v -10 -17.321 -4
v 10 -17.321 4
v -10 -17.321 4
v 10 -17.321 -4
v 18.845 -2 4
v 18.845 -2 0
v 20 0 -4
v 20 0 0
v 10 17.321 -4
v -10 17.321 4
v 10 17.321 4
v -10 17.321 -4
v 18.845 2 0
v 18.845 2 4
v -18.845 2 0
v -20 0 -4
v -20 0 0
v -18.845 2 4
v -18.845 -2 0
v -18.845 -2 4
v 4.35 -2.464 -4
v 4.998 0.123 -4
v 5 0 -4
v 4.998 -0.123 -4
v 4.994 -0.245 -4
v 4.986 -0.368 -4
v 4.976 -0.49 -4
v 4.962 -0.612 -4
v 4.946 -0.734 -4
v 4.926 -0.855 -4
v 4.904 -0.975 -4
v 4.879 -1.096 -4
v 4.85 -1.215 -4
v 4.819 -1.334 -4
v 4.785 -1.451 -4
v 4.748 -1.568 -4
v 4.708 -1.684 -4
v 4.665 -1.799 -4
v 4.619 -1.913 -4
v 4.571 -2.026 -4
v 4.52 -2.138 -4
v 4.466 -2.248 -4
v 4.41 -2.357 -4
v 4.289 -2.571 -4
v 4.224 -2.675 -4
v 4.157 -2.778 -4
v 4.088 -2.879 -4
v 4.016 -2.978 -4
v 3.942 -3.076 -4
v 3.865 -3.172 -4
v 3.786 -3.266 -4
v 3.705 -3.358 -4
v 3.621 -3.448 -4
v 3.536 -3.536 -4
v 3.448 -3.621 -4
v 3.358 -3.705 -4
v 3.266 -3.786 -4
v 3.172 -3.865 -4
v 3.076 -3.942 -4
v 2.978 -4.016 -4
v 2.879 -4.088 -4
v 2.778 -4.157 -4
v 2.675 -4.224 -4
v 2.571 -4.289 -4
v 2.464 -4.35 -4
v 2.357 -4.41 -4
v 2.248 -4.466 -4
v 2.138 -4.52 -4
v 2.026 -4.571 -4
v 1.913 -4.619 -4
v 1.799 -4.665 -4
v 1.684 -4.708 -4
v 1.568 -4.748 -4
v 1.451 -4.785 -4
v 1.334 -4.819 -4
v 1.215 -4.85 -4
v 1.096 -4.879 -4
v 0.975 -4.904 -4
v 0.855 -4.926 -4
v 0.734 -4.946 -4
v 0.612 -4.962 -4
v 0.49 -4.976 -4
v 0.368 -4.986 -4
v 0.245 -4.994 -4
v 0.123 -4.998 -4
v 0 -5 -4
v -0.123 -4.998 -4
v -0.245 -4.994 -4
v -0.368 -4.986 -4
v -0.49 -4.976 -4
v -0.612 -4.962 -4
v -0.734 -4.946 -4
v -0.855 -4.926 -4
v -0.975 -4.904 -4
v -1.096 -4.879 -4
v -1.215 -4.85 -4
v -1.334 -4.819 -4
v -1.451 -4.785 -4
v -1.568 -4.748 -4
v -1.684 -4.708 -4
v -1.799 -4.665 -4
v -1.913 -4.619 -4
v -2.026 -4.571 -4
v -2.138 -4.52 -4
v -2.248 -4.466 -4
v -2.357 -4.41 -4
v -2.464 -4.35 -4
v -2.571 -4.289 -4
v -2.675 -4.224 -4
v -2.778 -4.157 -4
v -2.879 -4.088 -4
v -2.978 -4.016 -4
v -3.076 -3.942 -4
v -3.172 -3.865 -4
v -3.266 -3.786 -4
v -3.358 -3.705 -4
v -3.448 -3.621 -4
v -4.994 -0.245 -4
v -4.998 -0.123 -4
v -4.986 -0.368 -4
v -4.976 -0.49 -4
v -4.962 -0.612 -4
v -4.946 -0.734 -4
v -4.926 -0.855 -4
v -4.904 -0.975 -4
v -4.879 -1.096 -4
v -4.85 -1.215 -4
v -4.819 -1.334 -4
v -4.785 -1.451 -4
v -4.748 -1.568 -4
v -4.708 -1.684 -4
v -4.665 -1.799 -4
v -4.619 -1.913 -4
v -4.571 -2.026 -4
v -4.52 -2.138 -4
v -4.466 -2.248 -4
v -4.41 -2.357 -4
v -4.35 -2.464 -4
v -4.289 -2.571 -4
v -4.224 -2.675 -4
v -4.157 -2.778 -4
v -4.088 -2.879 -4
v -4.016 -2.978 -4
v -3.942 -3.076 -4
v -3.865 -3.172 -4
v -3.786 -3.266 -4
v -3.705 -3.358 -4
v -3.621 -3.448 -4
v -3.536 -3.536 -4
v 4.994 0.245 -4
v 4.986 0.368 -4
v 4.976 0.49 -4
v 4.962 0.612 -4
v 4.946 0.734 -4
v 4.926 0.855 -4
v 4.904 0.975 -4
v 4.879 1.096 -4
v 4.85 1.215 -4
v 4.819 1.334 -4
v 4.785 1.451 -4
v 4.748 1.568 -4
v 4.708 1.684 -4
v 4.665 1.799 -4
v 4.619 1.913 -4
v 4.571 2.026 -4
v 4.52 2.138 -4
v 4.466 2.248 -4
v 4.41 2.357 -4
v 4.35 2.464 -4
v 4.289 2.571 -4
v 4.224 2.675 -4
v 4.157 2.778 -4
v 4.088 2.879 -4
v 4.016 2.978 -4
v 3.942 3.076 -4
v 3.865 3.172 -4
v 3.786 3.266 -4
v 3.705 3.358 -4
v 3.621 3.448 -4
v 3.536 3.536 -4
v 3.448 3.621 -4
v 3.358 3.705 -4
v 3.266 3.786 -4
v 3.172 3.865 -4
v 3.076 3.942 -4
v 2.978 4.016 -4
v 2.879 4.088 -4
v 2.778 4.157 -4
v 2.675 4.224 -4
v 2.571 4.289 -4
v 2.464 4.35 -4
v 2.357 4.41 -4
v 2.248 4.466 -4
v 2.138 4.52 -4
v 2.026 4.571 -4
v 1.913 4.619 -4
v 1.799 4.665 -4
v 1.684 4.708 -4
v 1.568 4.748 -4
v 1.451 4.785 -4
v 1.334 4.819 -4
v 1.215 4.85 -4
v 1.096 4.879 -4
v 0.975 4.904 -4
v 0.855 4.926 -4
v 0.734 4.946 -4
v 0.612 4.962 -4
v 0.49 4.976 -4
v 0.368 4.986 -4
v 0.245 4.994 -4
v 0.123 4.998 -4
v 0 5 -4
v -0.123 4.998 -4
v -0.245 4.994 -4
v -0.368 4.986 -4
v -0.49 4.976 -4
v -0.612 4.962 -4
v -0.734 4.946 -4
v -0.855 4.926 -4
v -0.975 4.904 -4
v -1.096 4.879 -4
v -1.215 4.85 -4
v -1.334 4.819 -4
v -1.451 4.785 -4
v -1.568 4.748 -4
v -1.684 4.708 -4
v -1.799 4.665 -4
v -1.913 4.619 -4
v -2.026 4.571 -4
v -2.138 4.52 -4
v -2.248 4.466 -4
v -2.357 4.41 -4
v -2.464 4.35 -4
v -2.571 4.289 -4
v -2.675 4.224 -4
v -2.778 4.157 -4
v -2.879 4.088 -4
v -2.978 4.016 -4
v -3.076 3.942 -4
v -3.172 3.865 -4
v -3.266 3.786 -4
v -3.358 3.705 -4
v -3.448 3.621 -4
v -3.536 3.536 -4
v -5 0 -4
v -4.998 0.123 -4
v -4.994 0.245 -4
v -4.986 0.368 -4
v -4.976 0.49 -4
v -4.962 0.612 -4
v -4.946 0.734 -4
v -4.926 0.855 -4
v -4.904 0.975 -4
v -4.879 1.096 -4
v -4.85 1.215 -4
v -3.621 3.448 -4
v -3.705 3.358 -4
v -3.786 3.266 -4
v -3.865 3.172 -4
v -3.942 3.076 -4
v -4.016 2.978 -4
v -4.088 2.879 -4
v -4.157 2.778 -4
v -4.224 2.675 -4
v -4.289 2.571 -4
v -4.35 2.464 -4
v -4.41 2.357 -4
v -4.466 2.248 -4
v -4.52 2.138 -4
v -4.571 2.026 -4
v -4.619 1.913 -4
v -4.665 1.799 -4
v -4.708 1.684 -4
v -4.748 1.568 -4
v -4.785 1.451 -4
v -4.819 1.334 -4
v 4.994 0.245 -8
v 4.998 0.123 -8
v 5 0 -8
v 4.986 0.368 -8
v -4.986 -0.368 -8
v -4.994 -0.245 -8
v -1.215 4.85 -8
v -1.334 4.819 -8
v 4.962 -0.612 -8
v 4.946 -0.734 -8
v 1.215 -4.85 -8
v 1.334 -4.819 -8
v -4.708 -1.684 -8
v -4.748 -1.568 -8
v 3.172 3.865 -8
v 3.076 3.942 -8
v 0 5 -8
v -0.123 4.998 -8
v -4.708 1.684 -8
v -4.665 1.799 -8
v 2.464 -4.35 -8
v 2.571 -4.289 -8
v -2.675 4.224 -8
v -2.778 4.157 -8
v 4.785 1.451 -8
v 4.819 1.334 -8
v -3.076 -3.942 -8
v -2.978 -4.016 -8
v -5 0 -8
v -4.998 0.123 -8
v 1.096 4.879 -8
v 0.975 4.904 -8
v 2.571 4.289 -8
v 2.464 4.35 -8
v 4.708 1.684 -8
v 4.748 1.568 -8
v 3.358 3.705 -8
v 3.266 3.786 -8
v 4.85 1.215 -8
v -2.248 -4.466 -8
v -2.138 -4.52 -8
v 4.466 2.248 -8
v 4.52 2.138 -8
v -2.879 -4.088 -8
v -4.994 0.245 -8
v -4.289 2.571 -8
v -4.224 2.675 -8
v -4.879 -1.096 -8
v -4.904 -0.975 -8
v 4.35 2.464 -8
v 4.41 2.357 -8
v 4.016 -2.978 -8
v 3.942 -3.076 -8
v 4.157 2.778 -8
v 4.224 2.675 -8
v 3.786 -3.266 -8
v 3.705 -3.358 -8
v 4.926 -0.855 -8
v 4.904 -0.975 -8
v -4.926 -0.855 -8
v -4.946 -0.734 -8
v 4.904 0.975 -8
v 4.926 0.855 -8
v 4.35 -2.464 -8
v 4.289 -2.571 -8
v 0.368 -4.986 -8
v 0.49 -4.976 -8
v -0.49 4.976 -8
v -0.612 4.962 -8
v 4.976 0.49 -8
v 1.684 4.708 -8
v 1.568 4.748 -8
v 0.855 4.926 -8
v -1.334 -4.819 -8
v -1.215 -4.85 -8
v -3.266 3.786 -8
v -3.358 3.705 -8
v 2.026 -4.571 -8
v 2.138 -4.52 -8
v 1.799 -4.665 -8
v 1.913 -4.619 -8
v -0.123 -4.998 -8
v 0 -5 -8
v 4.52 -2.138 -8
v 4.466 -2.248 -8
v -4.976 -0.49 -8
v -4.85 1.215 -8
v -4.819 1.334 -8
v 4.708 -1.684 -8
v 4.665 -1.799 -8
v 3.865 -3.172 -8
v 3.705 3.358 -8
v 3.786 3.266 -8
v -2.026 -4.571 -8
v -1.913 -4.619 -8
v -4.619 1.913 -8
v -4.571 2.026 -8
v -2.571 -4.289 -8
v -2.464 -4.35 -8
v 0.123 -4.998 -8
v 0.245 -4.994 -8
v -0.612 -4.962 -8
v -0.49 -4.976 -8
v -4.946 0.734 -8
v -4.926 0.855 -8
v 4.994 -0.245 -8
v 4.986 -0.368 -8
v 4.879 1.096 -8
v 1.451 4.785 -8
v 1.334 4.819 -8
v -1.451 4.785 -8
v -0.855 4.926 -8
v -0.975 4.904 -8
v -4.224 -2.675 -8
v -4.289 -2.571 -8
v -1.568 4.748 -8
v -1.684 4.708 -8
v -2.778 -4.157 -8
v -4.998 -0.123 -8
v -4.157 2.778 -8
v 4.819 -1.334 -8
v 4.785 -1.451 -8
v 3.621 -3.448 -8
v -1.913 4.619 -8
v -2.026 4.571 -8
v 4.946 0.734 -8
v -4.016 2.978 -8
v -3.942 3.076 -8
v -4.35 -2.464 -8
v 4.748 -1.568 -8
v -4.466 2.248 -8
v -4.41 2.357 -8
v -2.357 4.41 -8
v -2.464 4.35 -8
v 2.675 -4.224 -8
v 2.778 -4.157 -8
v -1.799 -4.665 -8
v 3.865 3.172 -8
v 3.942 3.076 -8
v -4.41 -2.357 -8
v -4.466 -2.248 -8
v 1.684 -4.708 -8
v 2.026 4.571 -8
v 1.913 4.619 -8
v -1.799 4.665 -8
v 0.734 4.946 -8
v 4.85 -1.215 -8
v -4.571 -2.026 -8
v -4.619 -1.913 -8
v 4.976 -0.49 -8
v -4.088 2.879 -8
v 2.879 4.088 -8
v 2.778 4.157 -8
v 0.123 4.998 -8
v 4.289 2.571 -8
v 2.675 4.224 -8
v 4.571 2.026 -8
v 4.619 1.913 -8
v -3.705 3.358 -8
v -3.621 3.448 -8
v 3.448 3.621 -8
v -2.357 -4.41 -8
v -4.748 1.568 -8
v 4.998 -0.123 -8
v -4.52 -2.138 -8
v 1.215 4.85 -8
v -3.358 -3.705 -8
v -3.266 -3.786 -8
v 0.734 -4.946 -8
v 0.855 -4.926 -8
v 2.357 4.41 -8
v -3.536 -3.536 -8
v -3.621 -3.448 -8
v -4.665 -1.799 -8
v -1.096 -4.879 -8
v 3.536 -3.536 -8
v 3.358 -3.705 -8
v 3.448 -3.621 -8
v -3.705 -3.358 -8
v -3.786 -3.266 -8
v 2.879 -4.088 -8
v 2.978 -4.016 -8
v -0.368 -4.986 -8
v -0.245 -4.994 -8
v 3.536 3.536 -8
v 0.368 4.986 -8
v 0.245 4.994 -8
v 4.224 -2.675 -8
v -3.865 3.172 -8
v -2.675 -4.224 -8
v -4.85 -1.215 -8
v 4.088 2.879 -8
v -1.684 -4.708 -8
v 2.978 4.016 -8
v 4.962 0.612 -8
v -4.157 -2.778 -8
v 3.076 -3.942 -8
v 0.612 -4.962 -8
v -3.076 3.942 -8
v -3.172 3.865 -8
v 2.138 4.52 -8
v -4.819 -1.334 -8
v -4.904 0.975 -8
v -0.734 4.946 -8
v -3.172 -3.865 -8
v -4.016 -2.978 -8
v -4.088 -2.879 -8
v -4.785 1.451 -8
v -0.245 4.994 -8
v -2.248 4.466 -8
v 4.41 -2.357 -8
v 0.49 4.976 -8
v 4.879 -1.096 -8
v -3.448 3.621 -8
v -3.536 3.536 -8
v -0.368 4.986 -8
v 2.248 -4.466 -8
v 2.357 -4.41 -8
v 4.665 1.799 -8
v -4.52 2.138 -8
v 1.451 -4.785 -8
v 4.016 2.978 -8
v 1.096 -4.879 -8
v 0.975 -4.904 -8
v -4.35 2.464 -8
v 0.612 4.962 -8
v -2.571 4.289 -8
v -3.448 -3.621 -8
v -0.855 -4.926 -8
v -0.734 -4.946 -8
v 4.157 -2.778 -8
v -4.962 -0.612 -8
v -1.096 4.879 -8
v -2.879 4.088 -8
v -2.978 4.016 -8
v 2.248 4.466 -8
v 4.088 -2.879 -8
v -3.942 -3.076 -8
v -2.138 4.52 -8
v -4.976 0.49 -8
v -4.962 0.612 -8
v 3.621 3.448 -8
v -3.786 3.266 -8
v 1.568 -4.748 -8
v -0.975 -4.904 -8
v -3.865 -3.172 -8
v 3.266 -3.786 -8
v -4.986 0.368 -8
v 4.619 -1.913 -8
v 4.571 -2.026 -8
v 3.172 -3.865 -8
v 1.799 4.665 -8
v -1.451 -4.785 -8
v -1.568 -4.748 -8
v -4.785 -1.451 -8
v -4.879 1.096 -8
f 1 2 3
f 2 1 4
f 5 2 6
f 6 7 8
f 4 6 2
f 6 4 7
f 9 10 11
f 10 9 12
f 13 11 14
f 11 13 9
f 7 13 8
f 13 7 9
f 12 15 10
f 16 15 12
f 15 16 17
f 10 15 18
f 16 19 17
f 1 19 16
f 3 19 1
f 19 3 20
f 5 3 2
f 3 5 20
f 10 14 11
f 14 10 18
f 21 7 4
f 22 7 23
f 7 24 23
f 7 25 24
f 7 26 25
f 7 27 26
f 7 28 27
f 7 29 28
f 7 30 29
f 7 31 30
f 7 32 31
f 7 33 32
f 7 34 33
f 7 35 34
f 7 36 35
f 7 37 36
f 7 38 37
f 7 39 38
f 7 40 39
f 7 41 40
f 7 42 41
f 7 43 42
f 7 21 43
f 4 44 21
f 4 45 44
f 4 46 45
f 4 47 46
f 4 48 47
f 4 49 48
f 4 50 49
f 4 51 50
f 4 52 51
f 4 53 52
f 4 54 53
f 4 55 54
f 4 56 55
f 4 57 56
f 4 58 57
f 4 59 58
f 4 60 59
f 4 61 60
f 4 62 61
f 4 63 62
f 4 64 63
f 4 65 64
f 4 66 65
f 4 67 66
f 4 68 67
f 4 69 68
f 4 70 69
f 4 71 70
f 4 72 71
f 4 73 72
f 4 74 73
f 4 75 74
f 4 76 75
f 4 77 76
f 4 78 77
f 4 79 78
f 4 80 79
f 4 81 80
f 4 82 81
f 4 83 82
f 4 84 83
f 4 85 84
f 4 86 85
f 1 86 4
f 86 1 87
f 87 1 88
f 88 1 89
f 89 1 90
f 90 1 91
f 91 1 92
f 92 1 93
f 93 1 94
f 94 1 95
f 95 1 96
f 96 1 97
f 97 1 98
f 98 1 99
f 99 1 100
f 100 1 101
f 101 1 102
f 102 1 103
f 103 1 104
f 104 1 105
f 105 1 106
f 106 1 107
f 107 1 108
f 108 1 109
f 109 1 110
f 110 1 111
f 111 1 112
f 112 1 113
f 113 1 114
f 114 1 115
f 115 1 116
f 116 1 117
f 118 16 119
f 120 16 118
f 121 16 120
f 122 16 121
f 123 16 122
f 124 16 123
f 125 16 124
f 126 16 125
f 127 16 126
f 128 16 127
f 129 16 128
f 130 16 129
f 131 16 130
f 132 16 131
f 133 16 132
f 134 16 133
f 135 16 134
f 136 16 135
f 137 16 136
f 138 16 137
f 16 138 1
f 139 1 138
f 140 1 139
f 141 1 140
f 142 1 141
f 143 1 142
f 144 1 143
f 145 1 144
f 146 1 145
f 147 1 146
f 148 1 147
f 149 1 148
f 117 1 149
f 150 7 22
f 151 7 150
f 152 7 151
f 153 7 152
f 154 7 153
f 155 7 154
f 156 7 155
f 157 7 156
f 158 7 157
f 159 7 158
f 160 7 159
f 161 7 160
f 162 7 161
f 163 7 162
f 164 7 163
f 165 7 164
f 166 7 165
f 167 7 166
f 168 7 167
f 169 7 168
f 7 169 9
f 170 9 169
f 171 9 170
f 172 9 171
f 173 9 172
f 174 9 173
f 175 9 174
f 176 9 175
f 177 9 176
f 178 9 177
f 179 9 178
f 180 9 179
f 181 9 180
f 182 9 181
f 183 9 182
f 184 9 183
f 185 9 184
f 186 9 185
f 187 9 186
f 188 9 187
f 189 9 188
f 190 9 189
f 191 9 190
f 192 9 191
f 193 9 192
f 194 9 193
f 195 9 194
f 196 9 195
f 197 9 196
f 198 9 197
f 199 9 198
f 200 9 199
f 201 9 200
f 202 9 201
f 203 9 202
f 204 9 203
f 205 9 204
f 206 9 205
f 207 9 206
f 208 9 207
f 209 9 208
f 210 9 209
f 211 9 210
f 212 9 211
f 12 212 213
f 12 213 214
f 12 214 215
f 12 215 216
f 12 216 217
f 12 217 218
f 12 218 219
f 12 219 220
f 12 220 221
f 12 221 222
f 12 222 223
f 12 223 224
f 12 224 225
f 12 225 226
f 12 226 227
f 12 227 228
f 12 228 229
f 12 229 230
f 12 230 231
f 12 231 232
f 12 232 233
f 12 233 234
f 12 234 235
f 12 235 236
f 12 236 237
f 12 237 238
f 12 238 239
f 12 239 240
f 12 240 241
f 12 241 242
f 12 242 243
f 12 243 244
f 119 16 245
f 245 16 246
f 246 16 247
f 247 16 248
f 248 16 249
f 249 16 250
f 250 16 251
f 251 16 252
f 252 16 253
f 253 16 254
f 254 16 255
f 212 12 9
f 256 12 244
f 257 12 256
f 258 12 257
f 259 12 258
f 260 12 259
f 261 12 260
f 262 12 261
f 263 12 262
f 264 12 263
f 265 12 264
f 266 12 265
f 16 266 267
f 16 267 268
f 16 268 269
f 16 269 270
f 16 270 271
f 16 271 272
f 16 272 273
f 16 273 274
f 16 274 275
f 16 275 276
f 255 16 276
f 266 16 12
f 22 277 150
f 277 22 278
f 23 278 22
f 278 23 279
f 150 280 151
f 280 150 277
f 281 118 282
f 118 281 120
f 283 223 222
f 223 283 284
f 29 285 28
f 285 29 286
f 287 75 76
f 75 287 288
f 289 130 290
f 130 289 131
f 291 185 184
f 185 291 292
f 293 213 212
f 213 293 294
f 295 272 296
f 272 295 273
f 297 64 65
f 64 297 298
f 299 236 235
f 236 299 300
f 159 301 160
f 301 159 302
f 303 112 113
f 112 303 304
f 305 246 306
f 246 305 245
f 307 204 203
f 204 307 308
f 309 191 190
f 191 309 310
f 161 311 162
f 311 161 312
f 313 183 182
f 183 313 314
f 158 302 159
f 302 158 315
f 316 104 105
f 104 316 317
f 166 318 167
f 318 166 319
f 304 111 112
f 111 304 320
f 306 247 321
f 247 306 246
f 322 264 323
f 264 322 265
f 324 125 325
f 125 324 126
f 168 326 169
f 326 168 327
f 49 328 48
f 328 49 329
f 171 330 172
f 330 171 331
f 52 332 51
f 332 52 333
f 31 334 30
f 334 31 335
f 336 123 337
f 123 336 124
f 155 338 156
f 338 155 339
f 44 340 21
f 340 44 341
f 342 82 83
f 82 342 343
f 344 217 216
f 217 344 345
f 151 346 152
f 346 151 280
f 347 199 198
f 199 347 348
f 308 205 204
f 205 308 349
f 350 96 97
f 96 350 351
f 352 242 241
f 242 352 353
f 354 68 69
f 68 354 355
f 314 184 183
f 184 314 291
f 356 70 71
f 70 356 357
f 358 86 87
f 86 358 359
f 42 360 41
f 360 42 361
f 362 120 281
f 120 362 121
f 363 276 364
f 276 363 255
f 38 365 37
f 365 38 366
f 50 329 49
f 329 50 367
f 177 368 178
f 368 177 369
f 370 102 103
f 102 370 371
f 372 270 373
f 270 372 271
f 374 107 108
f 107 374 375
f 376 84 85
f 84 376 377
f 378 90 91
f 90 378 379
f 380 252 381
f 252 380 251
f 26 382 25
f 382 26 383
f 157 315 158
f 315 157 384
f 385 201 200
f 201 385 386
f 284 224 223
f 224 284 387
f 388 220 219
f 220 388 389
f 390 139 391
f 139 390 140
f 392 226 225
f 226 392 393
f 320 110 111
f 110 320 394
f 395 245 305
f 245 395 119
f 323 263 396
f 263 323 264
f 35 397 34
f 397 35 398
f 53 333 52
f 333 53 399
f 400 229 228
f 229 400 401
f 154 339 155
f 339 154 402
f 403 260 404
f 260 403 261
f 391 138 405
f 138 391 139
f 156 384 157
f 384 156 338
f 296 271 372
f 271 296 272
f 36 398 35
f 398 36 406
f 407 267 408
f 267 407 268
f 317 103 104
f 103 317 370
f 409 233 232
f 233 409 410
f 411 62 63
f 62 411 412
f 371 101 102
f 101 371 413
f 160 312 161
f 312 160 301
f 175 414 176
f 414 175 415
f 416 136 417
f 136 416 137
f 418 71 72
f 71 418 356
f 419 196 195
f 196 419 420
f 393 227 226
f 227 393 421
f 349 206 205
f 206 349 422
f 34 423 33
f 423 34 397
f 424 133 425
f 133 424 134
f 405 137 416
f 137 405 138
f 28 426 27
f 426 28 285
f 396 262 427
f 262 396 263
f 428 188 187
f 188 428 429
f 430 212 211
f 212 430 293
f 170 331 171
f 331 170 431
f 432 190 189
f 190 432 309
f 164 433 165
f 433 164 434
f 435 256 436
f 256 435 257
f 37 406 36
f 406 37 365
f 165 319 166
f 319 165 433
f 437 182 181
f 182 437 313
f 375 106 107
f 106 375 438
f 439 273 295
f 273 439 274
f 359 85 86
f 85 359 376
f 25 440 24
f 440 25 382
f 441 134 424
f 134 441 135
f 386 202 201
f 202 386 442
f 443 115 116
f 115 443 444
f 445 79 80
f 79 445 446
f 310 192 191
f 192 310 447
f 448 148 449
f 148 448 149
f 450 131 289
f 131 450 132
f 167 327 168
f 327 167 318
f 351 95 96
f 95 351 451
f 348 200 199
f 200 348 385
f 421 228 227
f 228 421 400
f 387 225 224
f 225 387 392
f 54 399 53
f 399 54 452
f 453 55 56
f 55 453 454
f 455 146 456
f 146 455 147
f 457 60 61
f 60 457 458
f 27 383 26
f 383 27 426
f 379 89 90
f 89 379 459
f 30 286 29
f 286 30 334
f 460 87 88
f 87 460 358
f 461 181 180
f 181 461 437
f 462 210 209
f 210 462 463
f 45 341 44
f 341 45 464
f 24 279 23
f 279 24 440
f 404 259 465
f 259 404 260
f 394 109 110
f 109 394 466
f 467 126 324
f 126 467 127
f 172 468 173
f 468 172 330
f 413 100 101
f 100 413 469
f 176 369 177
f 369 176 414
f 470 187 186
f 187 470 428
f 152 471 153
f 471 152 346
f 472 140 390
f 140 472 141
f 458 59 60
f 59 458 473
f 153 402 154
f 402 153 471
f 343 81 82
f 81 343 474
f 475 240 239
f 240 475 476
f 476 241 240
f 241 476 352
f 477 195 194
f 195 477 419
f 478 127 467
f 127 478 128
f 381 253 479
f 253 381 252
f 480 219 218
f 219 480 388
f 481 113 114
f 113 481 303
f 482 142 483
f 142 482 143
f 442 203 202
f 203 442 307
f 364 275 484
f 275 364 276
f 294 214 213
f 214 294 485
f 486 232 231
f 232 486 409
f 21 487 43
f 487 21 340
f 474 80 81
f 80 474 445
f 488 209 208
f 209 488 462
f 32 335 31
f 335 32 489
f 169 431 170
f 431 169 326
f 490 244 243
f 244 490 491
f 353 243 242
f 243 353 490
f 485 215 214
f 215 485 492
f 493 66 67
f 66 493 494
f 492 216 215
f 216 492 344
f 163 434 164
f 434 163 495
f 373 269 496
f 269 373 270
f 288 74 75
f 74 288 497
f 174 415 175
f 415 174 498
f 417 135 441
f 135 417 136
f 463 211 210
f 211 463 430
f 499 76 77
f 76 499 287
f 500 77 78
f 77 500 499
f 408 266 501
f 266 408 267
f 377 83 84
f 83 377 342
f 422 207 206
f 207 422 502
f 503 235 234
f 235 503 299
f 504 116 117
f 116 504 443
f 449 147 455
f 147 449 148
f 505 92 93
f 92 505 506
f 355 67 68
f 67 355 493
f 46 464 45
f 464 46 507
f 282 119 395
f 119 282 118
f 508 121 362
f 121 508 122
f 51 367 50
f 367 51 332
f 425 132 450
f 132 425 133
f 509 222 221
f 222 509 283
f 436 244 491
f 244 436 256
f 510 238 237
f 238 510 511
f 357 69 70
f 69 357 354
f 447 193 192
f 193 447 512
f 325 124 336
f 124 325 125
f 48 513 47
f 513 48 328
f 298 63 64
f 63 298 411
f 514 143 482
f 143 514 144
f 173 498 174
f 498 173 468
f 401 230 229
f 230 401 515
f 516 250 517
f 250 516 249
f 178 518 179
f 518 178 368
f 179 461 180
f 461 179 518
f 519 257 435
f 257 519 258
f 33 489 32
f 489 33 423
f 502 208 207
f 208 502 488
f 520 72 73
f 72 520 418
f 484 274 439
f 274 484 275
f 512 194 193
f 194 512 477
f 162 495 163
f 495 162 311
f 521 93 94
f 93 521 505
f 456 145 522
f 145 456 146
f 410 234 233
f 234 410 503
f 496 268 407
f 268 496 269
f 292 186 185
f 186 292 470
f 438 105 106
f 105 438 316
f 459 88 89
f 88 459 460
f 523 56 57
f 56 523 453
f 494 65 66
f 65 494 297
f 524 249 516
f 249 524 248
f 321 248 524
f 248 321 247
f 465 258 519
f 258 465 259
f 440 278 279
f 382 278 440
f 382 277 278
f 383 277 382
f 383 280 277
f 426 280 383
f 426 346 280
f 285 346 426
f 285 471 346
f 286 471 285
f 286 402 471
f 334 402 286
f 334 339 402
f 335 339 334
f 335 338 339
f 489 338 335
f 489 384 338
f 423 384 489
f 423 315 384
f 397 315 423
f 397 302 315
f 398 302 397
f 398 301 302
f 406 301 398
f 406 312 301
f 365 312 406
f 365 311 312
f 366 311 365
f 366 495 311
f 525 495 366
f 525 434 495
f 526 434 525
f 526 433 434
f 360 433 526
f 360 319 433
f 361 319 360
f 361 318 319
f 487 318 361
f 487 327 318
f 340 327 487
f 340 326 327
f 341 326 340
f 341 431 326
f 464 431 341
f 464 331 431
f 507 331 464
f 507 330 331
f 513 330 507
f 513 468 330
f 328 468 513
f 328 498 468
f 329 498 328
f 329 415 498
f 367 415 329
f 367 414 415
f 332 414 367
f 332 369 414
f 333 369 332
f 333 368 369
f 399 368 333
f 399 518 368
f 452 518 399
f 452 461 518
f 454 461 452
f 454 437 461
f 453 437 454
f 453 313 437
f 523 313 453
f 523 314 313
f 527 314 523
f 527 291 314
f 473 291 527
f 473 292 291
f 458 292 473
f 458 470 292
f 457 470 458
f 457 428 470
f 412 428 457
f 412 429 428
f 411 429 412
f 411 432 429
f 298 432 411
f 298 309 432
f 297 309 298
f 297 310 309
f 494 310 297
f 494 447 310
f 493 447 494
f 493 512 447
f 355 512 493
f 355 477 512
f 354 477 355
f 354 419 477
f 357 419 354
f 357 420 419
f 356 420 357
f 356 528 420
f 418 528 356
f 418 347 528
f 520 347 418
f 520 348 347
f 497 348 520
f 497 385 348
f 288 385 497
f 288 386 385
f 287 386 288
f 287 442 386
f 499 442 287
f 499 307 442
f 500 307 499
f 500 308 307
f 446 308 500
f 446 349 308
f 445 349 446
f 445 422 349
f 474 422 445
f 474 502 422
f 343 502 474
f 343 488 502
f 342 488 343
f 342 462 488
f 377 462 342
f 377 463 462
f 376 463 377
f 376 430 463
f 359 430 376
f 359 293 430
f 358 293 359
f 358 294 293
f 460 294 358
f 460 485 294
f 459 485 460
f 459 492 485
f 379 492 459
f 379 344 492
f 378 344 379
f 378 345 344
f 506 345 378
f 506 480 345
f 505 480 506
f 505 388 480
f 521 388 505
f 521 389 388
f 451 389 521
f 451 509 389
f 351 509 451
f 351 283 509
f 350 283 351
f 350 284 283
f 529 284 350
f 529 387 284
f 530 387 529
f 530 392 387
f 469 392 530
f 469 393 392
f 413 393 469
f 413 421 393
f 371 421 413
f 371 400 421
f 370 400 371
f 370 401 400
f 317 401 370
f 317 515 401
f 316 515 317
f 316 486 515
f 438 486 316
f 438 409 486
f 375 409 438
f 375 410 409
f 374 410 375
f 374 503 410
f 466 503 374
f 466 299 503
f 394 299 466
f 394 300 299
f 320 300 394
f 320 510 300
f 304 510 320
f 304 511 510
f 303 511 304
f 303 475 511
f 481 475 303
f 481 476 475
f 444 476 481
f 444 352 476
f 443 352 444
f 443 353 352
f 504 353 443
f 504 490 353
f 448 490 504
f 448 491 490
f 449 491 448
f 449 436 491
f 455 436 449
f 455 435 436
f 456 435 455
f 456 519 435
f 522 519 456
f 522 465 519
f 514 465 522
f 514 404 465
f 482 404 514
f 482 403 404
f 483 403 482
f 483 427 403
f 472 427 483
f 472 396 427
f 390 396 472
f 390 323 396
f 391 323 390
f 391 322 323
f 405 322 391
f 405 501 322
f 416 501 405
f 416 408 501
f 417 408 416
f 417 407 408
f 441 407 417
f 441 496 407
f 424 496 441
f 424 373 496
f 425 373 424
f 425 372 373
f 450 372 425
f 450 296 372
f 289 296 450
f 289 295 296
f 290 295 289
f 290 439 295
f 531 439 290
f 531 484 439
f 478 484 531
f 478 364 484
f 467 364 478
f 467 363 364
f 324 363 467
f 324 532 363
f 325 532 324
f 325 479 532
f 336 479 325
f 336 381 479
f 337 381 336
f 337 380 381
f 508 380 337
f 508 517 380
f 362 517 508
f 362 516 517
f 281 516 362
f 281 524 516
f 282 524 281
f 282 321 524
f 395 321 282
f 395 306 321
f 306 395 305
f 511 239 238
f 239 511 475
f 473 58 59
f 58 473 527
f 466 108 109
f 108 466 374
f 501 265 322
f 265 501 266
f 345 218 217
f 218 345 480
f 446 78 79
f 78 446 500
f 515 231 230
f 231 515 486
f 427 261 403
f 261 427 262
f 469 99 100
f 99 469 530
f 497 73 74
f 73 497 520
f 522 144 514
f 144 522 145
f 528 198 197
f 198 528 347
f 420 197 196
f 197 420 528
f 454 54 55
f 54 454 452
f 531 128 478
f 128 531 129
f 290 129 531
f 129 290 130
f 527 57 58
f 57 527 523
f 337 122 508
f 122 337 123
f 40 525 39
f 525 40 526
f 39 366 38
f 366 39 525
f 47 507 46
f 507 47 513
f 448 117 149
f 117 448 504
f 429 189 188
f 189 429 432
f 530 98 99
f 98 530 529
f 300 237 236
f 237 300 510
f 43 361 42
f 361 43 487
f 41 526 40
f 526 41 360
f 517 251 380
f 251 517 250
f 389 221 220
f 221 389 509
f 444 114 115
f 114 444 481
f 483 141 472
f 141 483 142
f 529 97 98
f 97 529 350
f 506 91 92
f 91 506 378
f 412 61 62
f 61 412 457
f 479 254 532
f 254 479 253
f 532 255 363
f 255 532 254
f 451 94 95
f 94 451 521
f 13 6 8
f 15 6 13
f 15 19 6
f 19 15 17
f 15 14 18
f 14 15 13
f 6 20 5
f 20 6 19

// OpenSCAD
difference() {
	union() {
		cylinder($fn = 6, center = true, h = 8, r = 20);
		translate(v = [0, 0, -6.0000000000]) {
			cylinder($fn = 256, center = true, h = 4, r = 5);
		}
	}
	rotate(a = [0, 0, [0, 0, 150]]) {
		translate(v = [0, 0, 4.0000000000]) {
			cube(center = true, size = [60, 4, 8]);
		}
	}
}
/***********************************************
*********      SolidPython code:      **********
************************************************
 
__author__ = 'Mark Weinreuter'

from solid.utils import *

from config import *

mirror_thickness = 4

c = cylinder(block_r_mm, h=block_base_h_mm, center=True, segments=6)
c1 = cylinder(block_hole_r_mm, h=block_hole_h_mm, center=True, segments=256)

cut = cube([block_r_mm * 3, mirror_thickness, block_base_h_mm], center=True)

rotz = lambda z: rotate([0, 0, z])

cut = rotz([0, 0, 90 + 60])(up(block_base_h_mm / 2)(cut))

# holes_rots = (60, 60 + 180, 60 + 90, (60 + 90 + 180))
# holes = []
# for rot in holes_rots:
#    holes.append(
#        up(block_base_h_mm / 2)(rotate([0, 0, rot])(left(connector_dist_mm)(cylinder(connector_r_mm, h=block_base_h_mm, center=True, segments=256)))))


cable_hole = cylinder(cable_r_mm, h=block_base_h_mm * 10, center=True)
base = c + down((block_base_h_mm + block_hole_h_mm) / 2)(c1)
# base -= cable_hole
# for h in holes:
#    base -= h

turret_w = 30
turret_height = 50
turret_th = 4
t = cube([turret_w, turret_w, turret_height], center=True)
t_cutout = cube([turret_w - 2 * turret_th, turret_w, turret_height], center=True)
t -= translate([0, turret_th, -turret_th])(t_cutout)


base -= cut

scad_render_to_file(t, "scad/block_turret.scad")
scad_render_to_file(base, "scad/block_base.scad")

print("done")

r = cube([connector_dist_mm, 6, ])

# "https://shop.heise.de/archiv/download/free/type/1/product/211926/
 
 
************************************************/
